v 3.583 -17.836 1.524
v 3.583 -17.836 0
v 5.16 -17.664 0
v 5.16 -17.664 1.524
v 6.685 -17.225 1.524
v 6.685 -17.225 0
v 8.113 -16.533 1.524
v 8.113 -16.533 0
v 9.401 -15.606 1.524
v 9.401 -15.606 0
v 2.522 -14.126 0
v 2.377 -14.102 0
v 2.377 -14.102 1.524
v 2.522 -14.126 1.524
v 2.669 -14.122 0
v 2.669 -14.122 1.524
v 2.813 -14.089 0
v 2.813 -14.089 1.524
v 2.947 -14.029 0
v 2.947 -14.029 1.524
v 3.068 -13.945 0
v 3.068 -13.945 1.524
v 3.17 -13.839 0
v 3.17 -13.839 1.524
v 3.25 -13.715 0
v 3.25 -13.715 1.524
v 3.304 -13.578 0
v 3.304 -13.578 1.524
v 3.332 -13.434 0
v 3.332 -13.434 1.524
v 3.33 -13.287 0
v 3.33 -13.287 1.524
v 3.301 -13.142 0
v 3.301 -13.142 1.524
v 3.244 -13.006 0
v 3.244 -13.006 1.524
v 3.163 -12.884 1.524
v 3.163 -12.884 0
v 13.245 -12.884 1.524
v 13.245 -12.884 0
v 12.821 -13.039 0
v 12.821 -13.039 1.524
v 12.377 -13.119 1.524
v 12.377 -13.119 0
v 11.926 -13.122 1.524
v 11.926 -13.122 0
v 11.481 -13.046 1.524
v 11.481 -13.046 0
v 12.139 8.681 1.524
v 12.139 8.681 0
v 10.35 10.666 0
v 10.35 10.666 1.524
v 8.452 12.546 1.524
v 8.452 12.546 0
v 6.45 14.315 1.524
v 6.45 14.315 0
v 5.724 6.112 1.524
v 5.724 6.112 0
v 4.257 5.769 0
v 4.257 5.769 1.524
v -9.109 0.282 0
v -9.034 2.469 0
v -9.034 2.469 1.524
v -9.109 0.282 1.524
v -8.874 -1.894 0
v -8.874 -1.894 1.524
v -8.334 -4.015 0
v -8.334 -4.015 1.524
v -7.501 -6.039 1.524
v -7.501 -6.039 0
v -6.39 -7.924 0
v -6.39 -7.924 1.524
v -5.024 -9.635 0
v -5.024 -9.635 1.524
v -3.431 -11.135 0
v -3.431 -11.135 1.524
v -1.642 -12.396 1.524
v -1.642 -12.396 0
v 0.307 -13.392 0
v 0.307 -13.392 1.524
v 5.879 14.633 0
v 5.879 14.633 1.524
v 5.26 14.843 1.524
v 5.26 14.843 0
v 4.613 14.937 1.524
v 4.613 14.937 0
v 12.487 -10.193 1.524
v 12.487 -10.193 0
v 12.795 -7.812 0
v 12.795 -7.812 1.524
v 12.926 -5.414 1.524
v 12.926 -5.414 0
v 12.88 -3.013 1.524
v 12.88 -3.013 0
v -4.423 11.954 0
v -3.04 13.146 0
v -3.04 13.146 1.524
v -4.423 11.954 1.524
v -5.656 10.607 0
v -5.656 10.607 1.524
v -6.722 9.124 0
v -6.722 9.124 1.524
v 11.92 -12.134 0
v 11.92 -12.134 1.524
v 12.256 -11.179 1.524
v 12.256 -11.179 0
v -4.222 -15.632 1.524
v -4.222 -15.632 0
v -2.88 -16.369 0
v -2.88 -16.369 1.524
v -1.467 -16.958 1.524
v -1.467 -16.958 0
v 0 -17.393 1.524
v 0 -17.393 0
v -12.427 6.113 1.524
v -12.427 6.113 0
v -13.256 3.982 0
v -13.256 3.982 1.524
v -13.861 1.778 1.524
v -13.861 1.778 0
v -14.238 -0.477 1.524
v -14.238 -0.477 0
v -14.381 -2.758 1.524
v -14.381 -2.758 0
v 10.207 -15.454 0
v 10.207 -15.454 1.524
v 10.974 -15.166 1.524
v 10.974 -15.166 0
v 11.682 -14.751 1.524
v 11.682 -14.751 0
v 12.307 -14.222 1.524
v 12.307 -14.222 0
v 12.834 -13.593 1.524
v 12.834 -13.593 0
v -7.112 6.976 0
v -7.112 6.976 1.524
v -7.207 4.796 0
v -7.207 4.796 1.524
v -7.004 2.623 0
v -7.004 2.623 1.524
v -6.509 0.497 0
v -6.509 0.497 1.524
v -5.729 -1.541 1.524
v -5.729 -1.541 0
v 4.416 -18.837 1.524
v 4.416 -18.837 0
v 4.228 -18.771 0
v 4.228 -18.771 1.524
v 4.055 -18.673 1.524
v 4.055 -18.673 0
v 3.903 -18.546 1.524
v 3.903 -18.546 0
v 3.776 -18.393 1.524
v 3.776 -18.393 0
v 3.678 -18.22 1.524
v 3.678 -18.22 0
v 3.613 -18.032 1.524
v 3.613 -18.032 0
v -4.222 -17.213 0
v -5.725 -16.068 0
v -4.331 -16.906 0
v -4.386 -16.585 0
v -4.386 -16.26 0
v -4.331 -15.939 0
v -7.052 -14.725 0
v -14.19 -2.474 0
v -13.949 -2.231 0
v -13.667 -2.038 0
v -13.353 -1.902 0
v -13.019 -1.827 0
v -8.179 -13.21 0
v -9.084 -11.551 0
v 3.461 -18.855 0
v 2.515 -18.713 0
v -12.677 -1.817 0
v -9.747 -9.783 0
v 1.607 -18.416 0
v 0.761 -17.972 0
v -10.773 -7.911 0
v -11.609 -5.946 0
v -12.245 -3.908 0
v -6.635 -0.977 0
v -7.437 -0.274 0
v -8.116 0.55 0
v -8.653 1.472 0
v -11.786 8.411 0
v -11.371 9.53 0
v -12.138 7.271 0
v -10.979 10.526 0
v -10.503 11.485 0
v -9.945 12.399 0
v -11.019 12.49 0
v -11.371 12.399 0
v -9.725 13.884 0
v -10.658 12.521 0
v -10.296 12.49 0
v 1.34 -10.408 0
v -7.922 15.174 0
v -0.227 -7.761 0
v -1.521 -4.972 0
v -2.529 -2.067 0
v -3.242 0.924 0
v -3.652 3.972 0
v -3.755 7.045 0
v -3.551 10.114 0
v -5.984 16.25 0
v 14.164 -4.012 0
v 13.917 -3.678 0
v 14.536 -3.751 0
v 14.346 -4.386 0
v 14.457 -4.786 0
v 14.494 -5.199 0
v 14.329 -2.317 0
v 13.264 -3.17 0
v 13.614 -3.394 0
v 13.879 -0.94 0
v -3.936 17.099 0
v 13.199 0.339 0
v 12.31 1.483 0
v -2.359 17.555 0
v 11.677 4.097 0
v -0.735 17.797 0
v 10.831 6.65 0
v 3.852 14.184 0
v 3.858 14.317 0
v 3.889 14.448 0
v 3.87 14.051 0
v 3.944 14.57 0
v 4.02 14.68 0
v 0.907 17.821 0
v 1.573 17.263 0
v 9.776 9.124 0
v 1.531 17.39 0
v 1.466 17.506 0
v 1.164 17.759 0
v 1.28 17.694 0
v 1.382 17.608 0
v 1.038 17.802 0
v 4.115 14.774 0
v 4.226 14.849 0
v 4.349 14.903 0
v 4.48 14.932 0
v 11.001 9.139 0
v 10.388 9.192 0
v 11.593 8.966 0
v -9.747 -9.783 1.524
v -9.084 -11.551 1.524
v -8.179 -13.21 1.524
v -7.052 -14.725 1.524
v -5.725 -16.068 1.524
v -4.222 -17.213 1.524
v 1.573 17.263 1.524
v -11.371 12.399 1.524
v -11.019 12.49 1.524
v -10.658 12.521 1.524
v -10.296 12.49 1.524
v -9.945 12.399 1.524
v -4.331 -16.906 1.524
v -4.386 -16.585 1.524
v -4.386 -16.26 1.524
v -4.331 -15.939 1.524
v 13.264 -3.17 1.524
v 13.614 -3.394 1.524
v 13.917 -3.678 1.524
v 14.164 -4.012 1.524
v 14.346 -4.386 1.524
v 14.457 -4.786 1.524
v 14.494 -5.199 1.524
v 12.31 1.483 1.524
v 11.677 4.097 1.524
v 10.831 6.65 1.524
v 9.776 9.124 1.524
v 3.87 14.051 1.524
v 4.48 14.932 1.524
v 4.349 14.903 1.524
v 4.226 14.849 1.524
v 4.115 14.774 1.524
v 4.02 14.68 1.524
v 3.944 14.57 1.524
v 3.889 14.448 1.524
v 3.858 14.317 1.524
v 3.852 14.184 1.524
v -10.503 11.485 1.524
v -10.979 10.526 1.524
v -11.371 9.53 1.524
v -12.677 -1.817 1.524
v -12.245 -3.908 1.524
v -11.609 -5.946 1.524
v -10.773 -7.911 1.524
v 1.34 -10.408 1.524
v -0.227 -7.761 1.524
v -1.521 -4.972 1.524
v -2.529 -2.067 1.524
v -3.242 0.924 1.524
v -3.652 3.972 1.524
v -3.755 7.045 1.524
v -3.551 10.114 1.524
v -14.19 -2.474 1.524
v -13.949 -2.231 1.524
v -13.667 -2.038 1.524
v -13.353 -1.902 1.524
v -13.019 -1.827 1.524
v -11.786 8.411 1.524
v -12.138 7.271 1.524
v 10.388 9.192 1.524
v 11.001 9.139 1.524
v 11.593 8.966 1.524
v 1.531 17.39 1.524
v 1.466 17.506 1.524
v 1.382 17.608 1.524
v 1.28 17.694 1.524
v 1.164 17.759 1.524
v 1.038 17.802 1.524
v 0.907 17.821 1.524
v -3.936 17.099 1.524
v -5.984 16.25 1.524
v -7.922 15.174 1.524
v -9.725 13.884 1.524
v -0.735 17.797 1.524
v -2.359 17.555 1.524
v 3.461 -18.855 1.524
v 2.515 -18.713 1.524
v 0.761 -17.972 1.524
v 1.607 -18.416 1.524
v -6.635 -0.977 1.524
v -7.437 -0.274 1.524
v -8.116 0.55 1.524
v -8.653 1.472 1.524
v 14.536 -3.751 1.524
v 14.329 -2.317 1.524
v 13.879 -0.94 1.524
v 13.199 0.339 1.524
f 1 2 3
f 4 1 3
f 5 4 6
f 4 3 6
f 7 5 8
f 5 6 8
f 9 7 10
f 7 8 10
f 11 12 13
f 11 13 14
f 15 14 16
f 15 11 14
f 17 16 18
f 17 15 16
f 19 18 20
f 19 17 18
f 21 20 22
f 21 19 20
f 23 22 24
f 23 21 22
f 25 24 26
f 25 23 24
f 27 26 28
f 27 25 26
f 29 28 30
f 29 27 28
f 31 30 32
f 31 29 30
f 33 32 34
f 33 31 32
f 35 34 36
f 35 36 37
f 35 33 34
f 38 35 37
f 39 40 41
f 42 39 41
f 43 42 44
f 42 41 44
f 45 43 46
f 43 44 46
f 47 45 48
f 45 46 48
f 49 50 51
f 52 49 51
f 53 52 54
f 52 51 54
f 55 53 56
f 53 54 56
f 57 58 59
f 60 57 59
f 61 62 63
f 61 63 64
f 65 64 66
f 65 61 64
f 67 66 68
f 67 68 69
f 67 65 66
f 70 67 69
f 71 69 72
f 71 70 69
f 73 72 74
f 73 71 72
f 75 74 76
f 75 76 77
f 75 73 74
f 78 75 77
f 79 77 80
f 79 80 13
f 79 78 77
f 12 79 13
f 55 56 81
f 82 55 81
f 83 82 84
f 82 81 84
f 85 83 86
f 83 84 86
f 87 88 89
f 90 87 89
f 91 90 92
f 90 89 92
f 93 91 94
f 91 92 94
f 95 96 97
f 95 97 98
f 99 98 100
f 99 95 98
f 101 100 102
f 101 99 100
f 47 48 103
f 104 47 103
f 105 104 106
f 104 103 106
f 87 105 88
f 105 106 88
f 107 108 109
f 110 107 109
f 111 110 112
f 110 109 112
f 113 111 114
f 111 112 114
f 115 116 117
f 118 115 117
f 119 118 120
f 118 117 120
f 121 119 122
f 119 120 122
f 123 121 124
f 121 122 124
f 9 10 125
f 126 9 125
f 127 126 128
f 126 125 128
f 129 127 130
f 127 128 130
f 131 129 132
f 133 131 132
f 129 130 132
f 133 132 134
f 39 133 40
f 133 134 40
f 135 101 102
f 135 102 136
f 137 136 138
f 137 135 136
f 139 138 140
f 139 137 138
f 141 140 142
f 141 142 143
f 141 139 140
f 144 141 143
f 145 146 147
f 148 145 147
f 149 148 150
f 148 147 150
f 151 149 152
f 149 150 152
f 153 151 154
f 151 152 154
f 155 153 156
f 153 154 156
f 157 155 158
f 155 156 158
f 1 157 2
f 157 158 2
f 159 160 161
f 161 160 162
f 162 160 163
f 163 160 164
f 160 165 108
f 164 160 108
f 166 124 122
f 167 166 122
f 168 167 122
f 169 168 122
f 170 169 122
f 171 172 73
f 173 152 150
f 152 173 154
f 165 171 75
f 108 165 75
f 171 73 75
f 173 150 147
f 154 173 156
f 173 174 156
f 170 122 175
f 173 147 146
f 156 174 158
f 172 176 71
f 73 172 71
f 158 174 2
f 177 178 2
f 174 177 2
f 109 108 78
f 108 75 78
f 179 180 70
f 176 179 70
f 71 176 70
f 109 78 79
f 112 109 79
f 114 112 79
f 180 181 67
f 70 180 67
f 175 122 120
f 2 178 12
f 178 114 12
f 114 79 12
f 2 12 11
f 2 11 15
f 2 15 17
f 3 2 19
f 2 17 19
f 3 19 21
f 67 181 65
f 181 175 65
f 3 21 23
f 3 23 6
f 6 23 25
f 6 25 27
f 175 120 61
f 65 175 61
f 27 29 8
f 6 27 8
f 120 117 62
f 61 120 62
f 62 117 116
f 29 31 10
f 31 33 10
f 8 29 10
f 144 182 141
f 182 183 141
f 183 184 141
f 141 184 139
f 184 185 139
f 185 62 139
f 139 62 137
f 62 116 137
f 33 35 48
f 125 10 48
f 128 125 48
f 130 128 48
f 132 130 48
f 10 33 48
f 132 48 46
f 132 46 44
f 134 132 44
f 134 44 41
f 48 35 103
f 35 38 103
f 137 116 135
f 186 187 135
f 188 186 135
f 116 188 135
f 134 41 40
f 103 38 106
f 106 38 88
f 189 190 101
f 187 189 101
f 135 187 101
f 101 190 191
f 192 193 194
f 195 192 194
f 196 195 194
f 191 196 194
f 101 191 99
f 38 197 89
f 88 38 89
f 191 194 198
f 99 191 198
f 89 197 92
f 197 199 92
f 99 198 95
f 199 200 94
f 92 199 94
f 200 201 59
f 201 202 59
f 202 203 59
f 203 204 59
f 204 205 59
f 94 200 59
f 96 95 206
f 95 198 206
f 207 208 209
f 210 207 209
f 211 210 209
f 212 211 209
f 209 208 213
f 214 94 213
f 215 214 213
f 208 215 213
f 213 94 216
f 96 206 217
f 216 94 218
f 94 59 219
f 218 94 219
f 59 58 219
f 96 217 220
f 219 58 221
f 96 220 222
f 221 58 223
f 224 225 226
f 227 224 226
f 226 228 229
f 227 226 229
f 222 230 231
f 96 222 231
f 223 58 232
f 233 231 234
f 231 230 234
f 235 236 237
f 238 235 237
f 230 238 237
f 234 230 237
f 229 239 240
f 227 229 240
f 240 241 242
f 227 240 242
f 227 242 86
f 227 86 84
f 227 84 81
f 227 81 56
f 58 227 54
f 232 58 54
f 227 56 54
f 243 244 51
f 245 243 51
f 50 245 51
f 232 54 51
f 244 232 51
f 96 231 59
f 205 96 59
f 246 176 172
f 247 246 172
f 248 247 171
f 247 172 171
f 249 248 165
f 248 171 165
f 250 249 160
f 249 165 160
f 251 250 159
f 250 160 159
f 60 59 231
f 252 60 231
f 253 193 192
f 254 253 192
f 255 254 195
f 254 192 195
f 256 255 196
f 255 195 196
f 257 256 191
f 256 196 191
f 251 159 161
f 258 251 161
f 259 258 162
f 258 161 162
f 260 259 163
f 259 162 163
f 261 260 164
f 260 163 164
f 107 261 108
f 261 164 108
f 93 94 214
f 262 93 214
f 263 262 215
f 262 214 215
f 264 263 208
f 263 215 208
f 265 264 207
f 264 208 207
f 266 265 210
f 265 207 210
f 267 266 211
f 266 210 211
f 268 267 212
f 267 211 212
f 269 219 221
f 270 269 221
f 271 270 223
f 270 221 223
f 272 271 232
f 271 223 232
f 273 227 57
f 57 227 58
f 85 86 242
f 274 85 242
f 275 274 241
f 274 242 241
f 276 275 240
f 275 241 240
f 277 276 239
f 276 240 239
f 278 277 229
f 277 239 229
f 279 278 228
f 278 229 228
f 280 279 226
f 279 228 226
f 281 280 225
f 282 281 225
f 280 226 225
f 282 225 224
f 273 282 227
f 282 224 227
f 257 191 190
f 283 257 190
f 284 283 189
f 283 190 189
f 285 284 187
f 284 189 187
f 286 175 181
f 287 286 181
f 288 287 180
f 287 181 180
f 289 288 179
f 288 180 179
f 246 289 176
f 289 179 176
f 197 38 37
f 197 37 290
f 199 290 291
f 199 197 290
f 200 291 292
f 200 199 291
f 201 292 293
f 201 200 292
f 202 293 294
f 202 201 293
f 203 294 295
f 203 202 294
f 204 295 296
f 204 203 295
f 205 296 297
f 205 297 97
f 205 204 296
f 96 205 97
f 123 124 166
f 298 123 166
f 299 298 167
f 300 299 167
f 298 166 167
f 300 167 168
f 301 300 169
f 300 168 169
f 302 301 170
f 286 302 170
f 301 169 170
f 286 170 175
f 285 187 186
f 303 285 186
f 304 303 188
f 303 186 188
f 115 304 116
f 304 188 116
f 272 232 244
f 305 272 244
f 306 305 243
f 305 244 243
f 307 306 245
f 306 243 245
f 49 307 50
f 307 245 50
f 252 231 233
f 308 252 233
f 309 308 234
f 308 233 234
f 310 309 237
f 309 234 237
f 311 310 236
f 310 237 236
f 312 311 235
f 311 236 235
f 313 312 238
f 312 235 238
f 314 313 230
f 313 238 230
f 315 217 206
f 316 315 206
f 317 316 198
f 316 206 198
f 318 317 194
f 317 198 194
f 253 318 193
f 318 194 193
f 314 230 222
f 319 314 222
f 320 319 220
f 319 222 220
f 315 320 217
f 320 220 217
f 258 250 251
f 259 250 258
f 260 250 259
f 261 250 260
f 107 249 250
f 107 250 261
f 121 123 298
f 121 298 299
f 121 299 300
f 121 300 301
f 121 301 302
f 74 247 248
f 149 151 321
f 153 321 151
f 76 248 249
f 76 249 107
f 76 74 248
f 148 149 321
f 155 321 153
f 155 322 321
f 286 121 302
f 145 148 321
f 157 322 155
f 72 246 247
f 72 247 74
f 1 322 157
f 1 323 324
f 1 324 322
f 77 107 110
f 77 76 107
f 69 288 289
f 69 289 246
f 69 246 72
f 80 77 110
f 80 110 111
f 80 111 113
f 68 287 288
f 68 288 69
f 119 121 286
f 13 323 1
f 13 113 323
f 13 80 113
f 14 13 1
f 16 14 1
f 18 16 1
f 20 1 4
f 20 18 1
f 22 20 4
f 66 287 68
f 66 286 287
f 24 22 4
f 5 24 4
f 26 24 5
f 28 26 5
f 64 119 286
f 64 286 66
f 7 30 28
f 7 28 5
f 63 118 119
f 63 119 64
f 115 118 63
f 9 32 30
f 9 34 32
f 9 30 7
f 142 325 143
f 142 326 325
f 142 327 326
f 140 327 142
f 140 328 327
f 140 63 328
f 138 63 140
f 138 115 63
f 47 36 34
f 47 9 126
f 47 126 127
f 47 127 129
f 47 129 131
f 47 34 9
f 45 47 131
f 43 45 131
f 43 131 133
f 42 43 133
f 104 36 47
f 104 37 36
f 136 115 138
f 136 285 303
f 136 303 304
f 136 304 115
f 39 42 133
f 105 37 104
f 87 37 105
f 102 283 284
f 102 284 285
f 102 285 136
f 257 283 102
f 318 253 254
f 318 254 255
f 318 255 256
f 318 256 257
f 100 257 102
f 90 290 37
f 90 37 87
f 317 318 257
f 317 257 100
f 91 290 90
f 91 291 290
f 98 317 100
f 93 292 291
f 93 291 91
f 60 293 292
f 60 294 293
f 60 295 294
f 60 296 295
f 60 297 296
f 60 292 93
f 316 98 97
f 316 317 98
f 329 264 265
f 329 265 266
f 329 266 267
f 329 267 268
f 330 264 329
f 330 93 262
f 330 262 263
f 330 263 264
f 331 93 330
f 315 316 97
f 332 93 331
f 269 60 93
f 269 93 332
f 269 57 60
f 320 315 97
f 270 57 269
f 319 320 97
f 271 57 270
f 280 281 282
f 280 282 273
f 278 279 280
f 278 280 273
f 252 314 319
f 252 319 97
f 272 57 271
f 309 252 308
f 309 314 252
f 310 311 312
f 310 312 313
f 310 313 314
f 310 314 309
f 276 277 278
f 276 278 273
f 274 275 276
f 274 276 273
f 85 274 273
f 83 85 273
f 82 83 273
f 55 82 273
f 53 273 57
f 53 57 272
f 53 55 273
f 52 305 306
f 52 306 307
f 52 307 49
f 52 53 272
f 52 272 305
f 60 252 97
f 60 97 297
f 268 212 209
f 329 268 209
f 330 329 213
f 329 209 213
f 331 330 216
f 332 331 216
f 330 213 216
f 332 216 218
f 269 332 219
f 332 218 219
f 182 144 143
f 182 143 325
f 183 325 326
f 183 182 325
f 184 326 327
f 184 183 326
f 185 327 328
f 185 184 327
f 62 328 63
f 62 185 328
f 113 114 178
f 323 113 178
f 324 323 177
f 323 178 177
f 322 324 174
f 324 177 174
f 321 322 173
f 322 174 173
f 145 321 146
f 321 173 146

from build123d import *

# Parameters (mm, degrees)
BOSS_EXTRUDE1_DEPTH = 1.524


with BuildPart() as part:
    # Sketch1 → Boss-Extrude1 (new body)
    with BuildSketch(Plane.XY):
        with BuildLine():
            Line((4.256917141, 5.769411883), (1.572809007, 17.263448795))
            ThreePointArc((1.572809007, 17.263448795), (1.33277356, 17.653503195), (0.906545614, 17.821101488))
            ThreePointArc((0.906545614, 17.821101488), (-1.551180683, 17.70350979), (-3.936309018, 17.099018945))
            ThreePointArc((-3.936309018, 17.099018945), (-7.921935156, 15.173641861), (-11.370512849, 12.398825736))
            ThreePointArc((-11.370512849, 12.398825736), (-10.65795085, 12.520948262), (-9.945388851, 12.398825736))
            ThreePointArc((-9.945388851, 12.398825736), (-10.75175796, 11.010980832), (-11.370512849, 9.529938291))
            ThreePointArc((-11.370512849, 9.529938291), (-11.970031651, 7.843351342), (-12.427355406, 6.112786892))
            ThreePointArc((-12.427355406, 6.112786892), (-13.861120773, 1.778008598), (-14.380967646, -2.758040919))
            ThreePointArc((-14.380967646, -2.758040919), (-13.666638109, -2.037962277), (-12.676602307, -1.817487676))
            ThreePointArc((-12.676602307, -1.817487676), (-11.608509665, -5.94620724), (-9.747451479, -9.783342834))
            ThreePointArc((-9.747451479, -9.783342834), (-7.642342319, -13.987011856), (-4.222302714, -17.212790355))
            ThreePointArc((-4.222302714, -17.212790355), (-4.393060991, -16.422566374), (-4.222302714, -15.632342393))
            ThreePointArc((-4.222302714, -15.632342393), (-2.181732974, -16.682038059), (0, -17.393253279))
            ThreePointArc((0, -17.393253279), (2.054844162, -18.583773873), (4.416134447, -18.836819344))
            ThreePointArc((4.416134447, -18.836819344), (3.835913361, -18.472367282), (3.582858973, -17.835621422))
            ThreePointArc((3.582858973, -17.835621422), (6.685181318, -17.225290735), (9.400931472, -15.606152513))
            ThreePointArc((9.400931472, -15.606152513), (11.681500609, -14.751428539), (13.244817958, -12.883920166))
            ThreePointArc((13.244817958, -12.883920166), (12.377103481, -13.119413472), (11.481010343, -13.045911095))
            ThreePointArc((11.481010343, -13.045911095), (12.101156665, -11.660968144), (12.48661751, -10.193293666))
            ThreePointArc((12.48661751, -10.193293666), (12.882572593, -6.614027713), (12.879735524, -3.012928279))
            ThreePointArc((12.879735524, -3.012928279), (14.048115247, -3.839488411), (14.493985036, -5.19945641))
            ThreePointArc((14.493985036, -5.19945641), (14.133433894, -1.619098645), (12.309709537, 1.482995539))
            ThreePointArc((12.309709537, 1.482995539), (11.280344817, 5.382263311), (9.775547345, 9.123849265))
            ThreePointArc((9.775547345, 9.123849265), (11.001373452, 9.138607919), (12.138839862, 8.681401588))
            ThreePointArc((12.138839862, 8.681401588), (9.414557137, 11.619631747), (6.450200817, 14.315462683))
            ThreePointArc((6.450200817, 14.315462683), (5.574364255, 14.751975507), (4.613492818, 14.937337889))
            ThreePointArc((4.613492818, 14.937337889), (4.020029106, 14.680075469), (3.869846118, 14.050926679))
            Line((3.869846118, 14.050926679), (5.723654442, 6.111784154))
            Line((5.723654442, 6.111784154), (4.256917141, 5.769411883))
        make_face()
        with BuildLine():
            ThreePointArc((-3.040310387, 13.14603457), (-5.059685303, 11.298393601), (-6.72191547, 9.123849265))
            ThreePointArc((-6.72191547, 9.123849265), (-7.142476483, 3.70580008), (-5.728856427, -1.541466531))
            ThreePointArc((-5.728856427, -1.541466531), (-7.793494607, 0.12430808), (-9.03431247, 2.469069667))
            ThreePointArc((-9.03431247, 2.469069667), (-6.389960205, -7.924495098), (2.376676031, -14.102267879))
            ThreePointArc((2.376676031, -14.102267879), (3.21284, -13.778999141), (3.16277516, -12.883920166))
            ThreePointArc((3.16277516, -12.883920166), (-2.923149595, -0.580137917), (-3.040310387, 13.14603457))
        make_face(mode=Mode.SUBTRACT)
    extrude(amount=BOSS_EXTRUDE1_DEPTH)


solid = part.part
